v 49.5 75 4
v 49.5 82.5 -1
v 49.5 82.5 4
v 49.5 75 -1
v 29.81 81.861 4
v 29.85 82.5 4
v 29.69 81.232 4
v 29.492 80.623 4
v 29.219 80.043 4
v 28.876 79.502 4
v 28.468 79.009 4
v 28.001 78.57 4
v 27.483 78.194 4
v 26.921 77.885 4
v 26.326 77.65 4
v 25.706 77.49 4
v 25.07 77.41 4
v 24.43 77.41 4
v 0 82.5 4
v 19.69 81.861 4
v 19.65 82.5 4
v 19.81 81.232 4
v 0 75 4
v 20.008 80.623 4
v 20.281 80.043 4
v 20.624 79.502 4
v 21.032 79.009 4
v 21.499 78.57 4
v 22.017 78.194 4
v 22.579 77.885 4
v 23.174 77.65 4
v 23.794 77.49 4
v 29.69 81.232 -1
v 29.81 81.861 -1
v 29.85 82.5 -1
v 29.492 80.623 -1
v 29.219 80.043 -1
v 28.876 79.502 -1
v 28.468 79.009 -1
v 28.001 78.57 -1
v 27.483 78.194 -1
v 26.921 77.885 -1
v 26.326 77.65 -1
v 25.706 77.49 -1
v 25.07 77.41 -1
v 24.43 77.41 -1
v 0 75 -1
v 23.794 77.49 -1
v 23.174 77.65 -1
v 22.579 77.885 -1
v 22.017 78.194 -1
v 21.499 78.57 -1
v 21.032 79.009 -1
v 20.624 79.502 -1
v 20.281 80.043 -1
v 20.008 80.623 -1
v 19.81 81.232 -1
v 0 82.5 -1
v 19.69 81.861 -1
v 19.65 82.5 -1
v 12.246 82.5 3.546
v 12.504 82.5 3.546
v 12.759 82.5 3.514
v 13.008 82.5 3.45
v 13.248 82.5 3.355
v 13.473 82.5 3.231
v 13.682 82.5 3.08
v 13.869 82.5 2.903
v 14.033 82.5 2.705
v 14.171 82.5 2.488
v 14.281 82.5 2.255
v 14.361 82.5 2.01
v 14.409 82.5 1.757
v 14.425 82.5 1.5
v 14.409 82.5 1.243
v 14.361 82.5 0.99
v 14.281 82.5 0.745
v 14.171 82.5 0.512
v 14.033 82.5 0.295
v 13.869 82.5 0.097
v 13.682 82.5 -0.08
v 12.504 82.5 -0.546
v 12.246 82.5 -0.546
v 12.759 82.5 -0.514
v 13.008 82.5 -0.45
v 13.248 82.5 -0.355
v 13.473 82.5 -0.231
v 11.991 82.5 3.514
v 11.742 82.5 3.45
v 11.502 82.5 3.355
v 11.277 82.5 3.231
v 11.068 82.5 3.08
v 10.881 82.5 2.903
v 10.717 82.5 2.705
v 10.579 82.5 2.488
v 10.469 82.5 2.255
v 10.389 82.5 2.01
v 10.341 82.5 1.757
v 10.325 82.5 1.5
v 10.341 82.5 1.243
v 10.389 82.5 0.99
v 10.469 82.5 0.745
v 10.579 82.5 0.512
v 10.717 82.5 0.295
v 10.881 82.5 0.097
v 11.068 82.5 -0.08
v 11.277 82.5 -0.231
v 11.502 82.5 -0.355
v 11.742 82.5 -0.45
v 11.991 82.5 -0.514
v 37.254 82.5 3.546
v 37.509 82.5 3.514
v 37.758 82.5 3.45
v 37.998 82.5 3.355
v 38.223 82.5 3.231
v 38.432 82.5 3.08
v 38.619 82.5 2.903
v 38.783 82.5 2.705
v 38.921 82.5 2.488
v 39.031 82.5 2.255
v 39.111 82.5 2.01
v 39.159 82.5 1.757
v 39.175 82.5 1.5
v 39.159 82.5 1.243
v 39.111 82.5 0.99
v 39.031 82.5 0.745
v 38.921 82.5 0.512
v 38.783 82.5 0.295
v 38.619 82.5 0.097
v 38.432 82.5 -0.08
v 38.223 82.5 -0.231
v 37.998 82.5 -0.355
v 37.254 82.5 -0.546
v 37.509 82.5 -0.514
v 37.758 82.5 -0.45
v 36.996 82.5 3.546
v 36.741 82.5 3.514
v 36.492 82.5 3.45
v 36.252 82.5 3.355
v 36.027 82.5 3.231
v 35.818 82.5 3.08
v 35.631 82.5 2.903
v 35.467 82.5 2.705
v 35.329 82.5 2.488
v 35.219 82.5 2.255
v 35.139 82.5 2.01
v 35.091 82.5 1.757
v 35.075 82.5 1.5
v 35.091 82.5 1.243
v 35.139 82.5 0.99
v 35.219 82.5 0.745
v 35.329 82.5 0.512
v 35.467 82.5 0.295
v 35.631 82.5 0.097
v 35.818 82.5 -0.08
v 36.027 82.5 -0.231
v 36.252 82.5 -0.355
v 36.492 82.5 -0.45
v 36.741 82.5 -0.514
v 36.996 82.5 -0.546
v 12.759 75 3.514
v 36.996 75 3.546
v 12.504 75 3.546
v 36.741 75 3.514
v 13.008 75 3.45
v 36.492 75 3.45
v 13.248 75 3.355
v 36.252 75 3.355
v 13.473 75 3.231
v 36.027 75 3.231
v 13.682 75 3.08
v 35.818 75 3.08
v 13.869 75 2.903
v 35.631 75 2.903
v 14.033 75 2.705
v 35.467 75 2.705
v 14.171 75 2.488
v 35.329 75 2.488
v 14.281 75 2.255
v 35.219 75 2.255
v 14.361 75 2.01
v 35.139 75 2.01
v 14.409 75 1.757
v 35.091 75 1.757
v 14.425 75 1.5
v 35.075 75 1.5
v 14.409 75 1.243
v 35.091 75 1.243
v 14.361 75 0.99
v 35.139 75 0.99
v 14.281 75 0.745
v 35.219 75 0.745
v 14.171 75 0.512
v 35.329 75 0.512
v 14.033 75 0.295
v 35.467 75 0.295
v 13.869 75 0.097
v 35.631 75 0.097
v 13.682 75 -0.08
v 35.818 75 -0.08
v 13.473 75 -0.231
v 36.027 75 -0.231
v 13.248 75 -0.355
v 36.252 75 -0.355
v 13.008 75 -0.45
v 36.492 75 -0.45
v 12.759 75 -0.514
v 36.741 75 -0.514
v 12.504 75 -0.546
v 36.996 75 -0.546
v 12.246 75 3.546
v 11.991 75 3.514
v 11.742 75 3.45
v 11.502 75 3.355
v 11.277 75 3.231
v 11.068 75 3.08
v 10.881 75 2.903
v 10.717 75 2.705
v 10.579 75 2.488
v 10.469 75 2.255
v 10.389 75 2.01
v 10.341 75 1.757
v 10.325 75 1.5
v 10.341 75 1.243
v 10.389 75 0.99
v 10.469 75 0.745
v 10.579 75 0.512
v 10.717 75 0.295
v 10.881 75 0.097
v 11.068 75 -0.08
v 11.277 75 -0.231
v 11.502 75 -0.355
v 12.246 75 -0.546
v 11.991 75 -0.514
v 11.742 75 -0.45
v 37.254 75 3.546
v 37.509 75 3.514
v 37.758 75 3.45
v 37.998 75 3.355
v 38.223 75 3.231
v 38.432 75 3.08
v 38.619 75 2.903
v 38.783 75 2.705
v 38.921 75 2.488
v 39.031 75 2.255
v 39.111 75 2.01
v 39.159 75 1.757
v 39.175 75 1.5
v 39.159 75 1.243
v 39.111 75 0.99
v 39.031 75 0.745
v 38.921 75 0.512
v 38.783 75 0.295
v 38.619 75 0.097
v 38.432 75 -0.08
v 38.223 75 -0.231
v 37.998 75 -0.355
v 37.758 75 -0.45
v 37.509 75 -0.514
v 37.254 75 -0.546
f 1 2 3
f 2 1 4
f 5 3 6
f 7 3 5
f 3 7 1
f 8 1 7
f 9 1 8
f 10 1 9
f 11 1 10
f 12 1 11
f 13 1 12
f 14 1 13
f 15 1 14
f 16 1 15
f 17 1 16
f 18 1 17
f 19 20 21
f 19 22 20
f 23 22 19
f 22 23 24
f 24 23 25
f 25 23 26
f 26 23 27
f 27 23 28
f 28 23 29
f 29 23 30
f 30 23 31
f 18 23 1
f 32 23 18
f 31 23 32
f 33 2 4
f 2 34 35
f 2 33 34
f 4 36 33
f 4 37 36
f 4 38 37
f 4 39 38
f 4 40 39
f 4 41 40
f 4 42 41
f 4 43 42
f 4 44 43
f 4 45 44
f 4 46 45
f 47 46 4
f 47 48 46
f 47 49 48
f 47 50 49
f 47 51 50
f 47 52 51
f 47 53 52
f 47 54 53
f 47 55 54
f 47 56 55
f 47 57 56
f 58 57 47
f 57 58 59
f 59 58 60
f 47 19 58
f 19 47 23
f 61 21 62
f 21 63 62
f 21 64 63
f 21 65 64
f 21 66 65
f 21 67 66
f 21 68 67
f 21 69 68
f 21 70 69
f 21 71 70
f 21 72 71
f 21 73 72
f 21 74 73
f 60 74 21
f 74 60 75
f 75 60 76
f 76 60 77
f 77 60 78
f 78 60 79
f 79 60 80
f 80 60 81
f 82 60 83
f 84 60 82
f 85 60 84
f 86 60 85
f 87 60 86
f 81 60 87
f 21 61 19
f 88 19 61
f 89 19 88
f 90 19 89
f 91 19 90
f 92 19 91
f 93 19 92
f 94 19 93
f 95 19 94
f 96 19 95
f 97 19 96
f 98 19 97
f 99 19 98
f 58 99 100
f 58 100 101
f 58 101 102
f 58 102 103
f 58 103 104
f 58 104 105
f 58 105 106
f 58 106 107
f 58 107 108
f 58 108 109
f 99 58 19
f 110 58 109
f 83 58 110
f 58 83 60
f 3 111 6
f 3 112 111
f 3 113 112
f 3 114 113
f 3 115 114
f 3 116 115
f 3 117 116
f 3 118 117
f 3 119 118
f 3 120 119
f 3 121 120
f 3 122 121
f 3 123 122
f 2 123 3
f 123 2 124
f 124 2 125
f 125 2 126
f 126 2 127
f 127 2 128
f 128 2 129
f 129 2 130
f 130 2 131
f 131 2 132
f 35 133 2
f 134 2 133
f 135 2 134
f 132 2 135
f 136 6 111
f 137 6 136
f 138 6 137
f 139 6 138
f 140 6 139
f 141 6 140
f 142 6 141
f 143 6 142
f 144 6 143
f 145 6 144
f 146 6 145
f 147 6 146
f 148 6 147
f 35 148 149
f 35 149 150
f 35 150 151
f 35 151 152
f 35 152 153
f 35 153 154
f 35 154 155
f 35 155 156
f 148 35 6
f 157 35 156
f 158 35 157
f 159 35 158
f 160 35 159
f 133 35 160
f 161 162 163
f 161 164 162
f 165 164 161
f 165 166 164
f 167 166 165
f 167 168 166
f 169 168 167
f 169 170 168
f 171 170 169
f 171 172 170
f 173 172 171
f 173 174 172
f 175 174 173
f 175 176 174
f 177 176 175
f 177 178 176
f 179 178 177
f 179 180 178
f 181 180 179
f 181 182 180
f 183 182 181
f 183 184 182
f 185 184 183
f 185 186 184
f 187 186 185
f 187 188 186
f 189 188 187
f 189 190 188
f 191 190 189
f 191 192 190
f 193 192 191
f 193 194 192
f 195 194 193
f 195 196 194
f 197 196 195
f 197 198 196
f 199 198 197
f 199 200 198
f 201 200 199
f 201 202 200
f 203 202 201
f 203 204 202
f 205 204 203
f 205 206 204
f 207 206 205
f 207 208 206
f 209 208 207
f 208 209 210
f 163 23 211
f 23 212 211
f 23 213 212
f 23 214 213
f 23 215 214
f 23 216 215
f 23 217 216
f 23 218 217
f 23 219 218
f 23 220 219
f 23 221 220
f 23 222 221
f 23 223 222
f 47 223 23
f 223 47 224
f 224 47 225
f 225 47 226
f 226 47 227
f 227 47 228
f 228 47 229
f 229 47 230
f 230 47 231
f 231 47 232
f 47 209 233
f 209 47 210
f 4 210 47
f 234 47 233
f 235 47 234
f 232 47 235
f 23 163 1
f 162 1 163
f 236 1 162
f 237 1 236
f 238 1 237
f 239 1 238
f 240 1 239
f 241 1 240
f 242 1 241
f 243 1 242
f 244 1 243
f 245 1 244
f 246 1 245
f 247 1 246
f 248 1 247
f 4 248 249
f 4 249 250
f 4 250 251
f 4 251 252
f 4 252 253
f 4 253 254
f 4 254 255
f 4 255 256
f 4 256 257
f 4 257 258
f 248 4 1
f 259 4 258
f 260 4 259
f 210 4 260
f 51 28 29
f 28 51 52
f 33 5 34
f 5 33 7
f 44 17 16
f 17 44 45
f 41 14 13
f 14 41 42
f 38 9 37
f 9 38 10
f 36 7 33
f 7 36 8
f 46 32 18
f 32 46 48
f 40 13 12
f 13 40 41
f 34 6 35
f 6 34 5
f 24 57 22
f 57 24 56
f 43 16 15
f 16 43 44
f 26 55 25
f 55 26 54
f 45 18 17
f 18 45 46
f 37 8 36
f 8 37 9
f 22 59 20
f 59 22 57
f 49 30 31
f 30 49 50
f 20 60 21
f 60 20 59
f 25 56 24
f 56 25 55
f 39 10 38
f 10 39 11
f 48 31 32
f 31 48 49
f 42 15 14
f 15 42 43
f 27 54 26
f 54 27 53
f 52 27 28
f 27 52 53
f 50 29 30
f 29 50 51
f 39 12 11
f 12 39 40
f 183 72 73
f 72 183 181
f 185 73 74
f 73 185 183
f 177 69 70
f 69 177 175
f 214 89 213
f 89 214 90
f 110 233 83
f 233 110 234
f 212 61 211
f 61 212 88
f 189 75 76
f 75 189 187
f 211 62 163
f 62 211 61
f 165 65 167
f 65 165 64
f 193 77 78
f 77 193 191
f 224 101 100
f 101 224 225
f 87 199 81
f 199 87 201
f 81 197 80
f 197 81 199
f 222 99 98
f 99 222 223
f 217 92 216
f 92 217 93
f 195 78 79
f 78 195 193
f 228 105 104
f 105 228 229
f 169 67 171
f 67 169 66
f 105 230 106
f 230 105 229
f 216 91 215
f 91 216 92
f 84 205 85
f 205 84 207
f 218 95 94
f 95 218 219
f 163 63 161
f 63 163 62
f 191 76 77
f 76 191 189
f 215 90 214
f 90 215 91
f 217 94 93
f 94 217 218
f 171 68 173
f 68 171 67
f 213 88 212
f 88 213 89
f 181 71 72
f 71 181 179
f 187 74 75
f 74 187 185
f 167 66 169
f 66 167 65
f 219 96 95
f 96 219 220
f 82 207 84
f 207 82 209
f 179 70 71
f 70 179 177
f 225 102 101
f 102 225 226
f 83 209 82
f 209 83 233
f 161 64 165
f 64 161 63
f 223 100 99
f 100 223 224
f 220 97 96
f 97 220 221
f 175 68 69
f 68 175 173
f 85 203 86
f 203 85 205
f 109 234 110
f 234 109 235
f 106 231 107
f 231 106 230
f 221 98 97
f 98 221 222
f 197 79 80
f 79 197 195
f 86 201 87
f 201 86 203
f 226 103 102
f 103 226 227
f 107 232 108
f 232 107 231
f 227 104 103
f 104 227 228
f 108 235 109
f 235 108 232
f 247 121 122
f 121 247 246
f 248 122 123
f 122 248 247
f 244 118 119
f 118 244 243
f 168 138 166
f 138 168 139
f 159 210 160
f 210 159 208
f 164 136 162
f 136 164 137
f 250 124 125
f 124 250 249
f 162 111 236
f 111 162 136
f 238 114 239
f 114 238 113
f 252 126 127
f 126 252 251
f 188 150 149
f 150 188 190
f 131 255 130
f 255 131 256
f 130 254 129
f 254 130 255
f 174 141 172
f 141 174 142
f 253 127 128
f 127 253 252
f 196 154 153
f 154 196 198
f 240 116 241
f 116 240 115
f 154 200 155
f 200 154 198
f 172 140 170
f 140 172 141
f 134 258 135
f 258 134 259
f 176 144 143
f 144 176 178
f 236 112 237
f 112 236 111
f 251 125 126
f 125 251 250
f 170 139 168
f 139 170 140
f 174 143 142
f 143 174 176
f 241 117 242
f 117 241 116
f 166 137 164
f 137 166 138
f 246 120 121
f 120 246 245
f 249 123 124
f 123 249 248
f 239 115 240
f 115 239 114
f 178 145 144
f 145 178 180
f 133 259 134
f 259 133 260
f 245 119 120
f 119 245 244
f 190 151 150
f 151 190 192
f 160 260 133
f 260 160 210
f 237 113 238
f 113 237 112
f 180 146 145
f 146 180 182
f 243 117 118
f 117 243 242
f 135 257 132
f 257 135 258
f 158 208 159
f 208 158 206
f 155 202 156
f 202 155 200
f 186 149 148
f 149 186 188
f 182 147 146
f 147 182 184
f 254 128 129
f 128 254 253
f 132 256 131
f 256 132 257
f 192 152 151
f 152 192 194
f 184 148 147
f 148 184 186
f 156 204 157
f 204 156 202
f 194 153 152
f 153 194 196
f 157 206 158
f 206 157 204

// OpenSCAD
include <./modules.scad>;

//union()
//{
////    translate([8,5,-14])     rotate([90,0,0])    
////    {
////        difference()
////        {
////            cylinder(r=ep_axe,h=ep_cadre*echelle,$fn=50);
////            cylinder(r=2.5,h=ep_cadre*echelle,$fn=50);
////        }
////    }
////
////    translate([L*echelle/10-8,5,-14])     rotate([90,0,0])    
////    {
////        difference()
////        {
////            cylinder(r=ep_axe,h=ep_cadre*echelle,$fn=50);
////            cylinder(r=2.5,h=ep_cadre*echelle,$fn=50);
////        }
////    }
//
//    translate([0,0,2])
//    {
//        translate([8,5,6])     rotate([90,0,0])    
//        {
//            difference()
//            {
//                cylinder(r=ep_axe,h=ep_cadre*echelle,$fn=50);
//                cylinder(r=2.5,h=ep_cadre*echelle,$fn=50);
//            }
//        }
//
//        translate([L*echelle/10-8,5,6])     rotate([90,0,0])    
//        {
//            difference()
//            {
//                cylinder(r=ep_axe,h=ep_cadre*echelle,$fn=50);
//                cylinder(r=2.5,h=ep_cadre*echelle,$fn=50);
//            }
//        }
//    }
//
//    translate([0,0,-1])
//    difference()
//    {
//        cube([L*echelle/10,h*echelle/2,ep_cadre*echelle-jeu_axe]);
//        
//        for ( i = [0:h*echelle/5:h*echelle/3]) 
//        translate([5,10+i,0])  cube([L*echelle/10-10,h*echelle/5-5,ep_cadre*echelle+2]);
//        
//        translate([L*echelle/20,h*echelle/2,0])    cylinder(r=ep_axe+jeu_axe,h=ep_cadre*echelle+2,$fn=50);
//        
//        translate([L*echelle/40,h*echelle/2,ep_cadre*echelle/2])   rotate([90,0,0]) cylinder(r=2.05,h=ep_cadre*echelle*2,$fn=50);
//    translate([3*L*echelle/40,h*echelle/2,ep_cadre*echelle/2])   rotate([90,0,0]) cylinder(r=2.05,h=ep_cadre*echelle*2,$fn=50);
//    }
//
//
//
//
//    difference()
//    {
//        cube([ep_cadre*echelle,L*echelle/20,h*echelle/5]);
//        rotate([0,90,0]) translate([-h*echelle/5,L*echelle/20+2,0])   cylinder(r=L*echelle/20,h=ep_cadre*echelle,$fn=50);
//    }
//
////    scale([1,1,-1]) translate([0,0,-5])  difference()
////    {
////        cube([ep_cadre*echelle,L*echelle/20,h*echelle/5]);
////        rotate([0,90,0]) translate([-h*echelle/5,L*echelle/20+2,0])   cylinder(r=L*echelle/20,h=ep_cadre*echelle,$fn=50);
////    }
//
//    translate([L*echelle/10-5,0,0])
//    {
//        difference()
//        {
//            cube([ep_cadre*echelle,L*echelle/20,h*echelle/5]);
//            rotate([0,90,0]) translate([-h*echelle/5,L*echelle/20+2,0])   cylinder(r=L*echelle/20,h=ep_cadre*echelle,$fn=50);
//        }
//
////        scale([1,1,-1]) translate([0,0,-5])  difference()
////        {
////            cube([ep_cadre*echelle,L*echelle/20,h*echelle/5]);
////            rotate([0,90,0]) translate([-h*echelle/5,L*echelle/20+2,0])   cylinder(r=L*echelle/20,h=ep_cadre*echelle,$fn=50);
////        }
//    }
//}

color([1,0,0])
    translate([0,h*echelle/2,-1])
    difference()
    {
        cube([L*echelle/10,h*echelle/20,ep_cadre*echelle]);
               
        translate([L*echelle/20,h*echelle/20,0])    cylinder(r=ep_axe+jeu_axe,h=ep_cadre*echelle+2,$fn=50);
        
        translate([L*echelle/40,h*echelle/20,ep_cadre*echelle/2])   rotate([90,0,0]) cylinder(r=2.05,h=ep_cadre*echelle*2,$fn=50);
    translate([3*L*echelle/40,h*echelle/20,ep_cadre*echelle/2])   rotate([90,0,0]) cylinder(r=2.05,h=ep_cadre*echelle*2,$fn=50);
    }
